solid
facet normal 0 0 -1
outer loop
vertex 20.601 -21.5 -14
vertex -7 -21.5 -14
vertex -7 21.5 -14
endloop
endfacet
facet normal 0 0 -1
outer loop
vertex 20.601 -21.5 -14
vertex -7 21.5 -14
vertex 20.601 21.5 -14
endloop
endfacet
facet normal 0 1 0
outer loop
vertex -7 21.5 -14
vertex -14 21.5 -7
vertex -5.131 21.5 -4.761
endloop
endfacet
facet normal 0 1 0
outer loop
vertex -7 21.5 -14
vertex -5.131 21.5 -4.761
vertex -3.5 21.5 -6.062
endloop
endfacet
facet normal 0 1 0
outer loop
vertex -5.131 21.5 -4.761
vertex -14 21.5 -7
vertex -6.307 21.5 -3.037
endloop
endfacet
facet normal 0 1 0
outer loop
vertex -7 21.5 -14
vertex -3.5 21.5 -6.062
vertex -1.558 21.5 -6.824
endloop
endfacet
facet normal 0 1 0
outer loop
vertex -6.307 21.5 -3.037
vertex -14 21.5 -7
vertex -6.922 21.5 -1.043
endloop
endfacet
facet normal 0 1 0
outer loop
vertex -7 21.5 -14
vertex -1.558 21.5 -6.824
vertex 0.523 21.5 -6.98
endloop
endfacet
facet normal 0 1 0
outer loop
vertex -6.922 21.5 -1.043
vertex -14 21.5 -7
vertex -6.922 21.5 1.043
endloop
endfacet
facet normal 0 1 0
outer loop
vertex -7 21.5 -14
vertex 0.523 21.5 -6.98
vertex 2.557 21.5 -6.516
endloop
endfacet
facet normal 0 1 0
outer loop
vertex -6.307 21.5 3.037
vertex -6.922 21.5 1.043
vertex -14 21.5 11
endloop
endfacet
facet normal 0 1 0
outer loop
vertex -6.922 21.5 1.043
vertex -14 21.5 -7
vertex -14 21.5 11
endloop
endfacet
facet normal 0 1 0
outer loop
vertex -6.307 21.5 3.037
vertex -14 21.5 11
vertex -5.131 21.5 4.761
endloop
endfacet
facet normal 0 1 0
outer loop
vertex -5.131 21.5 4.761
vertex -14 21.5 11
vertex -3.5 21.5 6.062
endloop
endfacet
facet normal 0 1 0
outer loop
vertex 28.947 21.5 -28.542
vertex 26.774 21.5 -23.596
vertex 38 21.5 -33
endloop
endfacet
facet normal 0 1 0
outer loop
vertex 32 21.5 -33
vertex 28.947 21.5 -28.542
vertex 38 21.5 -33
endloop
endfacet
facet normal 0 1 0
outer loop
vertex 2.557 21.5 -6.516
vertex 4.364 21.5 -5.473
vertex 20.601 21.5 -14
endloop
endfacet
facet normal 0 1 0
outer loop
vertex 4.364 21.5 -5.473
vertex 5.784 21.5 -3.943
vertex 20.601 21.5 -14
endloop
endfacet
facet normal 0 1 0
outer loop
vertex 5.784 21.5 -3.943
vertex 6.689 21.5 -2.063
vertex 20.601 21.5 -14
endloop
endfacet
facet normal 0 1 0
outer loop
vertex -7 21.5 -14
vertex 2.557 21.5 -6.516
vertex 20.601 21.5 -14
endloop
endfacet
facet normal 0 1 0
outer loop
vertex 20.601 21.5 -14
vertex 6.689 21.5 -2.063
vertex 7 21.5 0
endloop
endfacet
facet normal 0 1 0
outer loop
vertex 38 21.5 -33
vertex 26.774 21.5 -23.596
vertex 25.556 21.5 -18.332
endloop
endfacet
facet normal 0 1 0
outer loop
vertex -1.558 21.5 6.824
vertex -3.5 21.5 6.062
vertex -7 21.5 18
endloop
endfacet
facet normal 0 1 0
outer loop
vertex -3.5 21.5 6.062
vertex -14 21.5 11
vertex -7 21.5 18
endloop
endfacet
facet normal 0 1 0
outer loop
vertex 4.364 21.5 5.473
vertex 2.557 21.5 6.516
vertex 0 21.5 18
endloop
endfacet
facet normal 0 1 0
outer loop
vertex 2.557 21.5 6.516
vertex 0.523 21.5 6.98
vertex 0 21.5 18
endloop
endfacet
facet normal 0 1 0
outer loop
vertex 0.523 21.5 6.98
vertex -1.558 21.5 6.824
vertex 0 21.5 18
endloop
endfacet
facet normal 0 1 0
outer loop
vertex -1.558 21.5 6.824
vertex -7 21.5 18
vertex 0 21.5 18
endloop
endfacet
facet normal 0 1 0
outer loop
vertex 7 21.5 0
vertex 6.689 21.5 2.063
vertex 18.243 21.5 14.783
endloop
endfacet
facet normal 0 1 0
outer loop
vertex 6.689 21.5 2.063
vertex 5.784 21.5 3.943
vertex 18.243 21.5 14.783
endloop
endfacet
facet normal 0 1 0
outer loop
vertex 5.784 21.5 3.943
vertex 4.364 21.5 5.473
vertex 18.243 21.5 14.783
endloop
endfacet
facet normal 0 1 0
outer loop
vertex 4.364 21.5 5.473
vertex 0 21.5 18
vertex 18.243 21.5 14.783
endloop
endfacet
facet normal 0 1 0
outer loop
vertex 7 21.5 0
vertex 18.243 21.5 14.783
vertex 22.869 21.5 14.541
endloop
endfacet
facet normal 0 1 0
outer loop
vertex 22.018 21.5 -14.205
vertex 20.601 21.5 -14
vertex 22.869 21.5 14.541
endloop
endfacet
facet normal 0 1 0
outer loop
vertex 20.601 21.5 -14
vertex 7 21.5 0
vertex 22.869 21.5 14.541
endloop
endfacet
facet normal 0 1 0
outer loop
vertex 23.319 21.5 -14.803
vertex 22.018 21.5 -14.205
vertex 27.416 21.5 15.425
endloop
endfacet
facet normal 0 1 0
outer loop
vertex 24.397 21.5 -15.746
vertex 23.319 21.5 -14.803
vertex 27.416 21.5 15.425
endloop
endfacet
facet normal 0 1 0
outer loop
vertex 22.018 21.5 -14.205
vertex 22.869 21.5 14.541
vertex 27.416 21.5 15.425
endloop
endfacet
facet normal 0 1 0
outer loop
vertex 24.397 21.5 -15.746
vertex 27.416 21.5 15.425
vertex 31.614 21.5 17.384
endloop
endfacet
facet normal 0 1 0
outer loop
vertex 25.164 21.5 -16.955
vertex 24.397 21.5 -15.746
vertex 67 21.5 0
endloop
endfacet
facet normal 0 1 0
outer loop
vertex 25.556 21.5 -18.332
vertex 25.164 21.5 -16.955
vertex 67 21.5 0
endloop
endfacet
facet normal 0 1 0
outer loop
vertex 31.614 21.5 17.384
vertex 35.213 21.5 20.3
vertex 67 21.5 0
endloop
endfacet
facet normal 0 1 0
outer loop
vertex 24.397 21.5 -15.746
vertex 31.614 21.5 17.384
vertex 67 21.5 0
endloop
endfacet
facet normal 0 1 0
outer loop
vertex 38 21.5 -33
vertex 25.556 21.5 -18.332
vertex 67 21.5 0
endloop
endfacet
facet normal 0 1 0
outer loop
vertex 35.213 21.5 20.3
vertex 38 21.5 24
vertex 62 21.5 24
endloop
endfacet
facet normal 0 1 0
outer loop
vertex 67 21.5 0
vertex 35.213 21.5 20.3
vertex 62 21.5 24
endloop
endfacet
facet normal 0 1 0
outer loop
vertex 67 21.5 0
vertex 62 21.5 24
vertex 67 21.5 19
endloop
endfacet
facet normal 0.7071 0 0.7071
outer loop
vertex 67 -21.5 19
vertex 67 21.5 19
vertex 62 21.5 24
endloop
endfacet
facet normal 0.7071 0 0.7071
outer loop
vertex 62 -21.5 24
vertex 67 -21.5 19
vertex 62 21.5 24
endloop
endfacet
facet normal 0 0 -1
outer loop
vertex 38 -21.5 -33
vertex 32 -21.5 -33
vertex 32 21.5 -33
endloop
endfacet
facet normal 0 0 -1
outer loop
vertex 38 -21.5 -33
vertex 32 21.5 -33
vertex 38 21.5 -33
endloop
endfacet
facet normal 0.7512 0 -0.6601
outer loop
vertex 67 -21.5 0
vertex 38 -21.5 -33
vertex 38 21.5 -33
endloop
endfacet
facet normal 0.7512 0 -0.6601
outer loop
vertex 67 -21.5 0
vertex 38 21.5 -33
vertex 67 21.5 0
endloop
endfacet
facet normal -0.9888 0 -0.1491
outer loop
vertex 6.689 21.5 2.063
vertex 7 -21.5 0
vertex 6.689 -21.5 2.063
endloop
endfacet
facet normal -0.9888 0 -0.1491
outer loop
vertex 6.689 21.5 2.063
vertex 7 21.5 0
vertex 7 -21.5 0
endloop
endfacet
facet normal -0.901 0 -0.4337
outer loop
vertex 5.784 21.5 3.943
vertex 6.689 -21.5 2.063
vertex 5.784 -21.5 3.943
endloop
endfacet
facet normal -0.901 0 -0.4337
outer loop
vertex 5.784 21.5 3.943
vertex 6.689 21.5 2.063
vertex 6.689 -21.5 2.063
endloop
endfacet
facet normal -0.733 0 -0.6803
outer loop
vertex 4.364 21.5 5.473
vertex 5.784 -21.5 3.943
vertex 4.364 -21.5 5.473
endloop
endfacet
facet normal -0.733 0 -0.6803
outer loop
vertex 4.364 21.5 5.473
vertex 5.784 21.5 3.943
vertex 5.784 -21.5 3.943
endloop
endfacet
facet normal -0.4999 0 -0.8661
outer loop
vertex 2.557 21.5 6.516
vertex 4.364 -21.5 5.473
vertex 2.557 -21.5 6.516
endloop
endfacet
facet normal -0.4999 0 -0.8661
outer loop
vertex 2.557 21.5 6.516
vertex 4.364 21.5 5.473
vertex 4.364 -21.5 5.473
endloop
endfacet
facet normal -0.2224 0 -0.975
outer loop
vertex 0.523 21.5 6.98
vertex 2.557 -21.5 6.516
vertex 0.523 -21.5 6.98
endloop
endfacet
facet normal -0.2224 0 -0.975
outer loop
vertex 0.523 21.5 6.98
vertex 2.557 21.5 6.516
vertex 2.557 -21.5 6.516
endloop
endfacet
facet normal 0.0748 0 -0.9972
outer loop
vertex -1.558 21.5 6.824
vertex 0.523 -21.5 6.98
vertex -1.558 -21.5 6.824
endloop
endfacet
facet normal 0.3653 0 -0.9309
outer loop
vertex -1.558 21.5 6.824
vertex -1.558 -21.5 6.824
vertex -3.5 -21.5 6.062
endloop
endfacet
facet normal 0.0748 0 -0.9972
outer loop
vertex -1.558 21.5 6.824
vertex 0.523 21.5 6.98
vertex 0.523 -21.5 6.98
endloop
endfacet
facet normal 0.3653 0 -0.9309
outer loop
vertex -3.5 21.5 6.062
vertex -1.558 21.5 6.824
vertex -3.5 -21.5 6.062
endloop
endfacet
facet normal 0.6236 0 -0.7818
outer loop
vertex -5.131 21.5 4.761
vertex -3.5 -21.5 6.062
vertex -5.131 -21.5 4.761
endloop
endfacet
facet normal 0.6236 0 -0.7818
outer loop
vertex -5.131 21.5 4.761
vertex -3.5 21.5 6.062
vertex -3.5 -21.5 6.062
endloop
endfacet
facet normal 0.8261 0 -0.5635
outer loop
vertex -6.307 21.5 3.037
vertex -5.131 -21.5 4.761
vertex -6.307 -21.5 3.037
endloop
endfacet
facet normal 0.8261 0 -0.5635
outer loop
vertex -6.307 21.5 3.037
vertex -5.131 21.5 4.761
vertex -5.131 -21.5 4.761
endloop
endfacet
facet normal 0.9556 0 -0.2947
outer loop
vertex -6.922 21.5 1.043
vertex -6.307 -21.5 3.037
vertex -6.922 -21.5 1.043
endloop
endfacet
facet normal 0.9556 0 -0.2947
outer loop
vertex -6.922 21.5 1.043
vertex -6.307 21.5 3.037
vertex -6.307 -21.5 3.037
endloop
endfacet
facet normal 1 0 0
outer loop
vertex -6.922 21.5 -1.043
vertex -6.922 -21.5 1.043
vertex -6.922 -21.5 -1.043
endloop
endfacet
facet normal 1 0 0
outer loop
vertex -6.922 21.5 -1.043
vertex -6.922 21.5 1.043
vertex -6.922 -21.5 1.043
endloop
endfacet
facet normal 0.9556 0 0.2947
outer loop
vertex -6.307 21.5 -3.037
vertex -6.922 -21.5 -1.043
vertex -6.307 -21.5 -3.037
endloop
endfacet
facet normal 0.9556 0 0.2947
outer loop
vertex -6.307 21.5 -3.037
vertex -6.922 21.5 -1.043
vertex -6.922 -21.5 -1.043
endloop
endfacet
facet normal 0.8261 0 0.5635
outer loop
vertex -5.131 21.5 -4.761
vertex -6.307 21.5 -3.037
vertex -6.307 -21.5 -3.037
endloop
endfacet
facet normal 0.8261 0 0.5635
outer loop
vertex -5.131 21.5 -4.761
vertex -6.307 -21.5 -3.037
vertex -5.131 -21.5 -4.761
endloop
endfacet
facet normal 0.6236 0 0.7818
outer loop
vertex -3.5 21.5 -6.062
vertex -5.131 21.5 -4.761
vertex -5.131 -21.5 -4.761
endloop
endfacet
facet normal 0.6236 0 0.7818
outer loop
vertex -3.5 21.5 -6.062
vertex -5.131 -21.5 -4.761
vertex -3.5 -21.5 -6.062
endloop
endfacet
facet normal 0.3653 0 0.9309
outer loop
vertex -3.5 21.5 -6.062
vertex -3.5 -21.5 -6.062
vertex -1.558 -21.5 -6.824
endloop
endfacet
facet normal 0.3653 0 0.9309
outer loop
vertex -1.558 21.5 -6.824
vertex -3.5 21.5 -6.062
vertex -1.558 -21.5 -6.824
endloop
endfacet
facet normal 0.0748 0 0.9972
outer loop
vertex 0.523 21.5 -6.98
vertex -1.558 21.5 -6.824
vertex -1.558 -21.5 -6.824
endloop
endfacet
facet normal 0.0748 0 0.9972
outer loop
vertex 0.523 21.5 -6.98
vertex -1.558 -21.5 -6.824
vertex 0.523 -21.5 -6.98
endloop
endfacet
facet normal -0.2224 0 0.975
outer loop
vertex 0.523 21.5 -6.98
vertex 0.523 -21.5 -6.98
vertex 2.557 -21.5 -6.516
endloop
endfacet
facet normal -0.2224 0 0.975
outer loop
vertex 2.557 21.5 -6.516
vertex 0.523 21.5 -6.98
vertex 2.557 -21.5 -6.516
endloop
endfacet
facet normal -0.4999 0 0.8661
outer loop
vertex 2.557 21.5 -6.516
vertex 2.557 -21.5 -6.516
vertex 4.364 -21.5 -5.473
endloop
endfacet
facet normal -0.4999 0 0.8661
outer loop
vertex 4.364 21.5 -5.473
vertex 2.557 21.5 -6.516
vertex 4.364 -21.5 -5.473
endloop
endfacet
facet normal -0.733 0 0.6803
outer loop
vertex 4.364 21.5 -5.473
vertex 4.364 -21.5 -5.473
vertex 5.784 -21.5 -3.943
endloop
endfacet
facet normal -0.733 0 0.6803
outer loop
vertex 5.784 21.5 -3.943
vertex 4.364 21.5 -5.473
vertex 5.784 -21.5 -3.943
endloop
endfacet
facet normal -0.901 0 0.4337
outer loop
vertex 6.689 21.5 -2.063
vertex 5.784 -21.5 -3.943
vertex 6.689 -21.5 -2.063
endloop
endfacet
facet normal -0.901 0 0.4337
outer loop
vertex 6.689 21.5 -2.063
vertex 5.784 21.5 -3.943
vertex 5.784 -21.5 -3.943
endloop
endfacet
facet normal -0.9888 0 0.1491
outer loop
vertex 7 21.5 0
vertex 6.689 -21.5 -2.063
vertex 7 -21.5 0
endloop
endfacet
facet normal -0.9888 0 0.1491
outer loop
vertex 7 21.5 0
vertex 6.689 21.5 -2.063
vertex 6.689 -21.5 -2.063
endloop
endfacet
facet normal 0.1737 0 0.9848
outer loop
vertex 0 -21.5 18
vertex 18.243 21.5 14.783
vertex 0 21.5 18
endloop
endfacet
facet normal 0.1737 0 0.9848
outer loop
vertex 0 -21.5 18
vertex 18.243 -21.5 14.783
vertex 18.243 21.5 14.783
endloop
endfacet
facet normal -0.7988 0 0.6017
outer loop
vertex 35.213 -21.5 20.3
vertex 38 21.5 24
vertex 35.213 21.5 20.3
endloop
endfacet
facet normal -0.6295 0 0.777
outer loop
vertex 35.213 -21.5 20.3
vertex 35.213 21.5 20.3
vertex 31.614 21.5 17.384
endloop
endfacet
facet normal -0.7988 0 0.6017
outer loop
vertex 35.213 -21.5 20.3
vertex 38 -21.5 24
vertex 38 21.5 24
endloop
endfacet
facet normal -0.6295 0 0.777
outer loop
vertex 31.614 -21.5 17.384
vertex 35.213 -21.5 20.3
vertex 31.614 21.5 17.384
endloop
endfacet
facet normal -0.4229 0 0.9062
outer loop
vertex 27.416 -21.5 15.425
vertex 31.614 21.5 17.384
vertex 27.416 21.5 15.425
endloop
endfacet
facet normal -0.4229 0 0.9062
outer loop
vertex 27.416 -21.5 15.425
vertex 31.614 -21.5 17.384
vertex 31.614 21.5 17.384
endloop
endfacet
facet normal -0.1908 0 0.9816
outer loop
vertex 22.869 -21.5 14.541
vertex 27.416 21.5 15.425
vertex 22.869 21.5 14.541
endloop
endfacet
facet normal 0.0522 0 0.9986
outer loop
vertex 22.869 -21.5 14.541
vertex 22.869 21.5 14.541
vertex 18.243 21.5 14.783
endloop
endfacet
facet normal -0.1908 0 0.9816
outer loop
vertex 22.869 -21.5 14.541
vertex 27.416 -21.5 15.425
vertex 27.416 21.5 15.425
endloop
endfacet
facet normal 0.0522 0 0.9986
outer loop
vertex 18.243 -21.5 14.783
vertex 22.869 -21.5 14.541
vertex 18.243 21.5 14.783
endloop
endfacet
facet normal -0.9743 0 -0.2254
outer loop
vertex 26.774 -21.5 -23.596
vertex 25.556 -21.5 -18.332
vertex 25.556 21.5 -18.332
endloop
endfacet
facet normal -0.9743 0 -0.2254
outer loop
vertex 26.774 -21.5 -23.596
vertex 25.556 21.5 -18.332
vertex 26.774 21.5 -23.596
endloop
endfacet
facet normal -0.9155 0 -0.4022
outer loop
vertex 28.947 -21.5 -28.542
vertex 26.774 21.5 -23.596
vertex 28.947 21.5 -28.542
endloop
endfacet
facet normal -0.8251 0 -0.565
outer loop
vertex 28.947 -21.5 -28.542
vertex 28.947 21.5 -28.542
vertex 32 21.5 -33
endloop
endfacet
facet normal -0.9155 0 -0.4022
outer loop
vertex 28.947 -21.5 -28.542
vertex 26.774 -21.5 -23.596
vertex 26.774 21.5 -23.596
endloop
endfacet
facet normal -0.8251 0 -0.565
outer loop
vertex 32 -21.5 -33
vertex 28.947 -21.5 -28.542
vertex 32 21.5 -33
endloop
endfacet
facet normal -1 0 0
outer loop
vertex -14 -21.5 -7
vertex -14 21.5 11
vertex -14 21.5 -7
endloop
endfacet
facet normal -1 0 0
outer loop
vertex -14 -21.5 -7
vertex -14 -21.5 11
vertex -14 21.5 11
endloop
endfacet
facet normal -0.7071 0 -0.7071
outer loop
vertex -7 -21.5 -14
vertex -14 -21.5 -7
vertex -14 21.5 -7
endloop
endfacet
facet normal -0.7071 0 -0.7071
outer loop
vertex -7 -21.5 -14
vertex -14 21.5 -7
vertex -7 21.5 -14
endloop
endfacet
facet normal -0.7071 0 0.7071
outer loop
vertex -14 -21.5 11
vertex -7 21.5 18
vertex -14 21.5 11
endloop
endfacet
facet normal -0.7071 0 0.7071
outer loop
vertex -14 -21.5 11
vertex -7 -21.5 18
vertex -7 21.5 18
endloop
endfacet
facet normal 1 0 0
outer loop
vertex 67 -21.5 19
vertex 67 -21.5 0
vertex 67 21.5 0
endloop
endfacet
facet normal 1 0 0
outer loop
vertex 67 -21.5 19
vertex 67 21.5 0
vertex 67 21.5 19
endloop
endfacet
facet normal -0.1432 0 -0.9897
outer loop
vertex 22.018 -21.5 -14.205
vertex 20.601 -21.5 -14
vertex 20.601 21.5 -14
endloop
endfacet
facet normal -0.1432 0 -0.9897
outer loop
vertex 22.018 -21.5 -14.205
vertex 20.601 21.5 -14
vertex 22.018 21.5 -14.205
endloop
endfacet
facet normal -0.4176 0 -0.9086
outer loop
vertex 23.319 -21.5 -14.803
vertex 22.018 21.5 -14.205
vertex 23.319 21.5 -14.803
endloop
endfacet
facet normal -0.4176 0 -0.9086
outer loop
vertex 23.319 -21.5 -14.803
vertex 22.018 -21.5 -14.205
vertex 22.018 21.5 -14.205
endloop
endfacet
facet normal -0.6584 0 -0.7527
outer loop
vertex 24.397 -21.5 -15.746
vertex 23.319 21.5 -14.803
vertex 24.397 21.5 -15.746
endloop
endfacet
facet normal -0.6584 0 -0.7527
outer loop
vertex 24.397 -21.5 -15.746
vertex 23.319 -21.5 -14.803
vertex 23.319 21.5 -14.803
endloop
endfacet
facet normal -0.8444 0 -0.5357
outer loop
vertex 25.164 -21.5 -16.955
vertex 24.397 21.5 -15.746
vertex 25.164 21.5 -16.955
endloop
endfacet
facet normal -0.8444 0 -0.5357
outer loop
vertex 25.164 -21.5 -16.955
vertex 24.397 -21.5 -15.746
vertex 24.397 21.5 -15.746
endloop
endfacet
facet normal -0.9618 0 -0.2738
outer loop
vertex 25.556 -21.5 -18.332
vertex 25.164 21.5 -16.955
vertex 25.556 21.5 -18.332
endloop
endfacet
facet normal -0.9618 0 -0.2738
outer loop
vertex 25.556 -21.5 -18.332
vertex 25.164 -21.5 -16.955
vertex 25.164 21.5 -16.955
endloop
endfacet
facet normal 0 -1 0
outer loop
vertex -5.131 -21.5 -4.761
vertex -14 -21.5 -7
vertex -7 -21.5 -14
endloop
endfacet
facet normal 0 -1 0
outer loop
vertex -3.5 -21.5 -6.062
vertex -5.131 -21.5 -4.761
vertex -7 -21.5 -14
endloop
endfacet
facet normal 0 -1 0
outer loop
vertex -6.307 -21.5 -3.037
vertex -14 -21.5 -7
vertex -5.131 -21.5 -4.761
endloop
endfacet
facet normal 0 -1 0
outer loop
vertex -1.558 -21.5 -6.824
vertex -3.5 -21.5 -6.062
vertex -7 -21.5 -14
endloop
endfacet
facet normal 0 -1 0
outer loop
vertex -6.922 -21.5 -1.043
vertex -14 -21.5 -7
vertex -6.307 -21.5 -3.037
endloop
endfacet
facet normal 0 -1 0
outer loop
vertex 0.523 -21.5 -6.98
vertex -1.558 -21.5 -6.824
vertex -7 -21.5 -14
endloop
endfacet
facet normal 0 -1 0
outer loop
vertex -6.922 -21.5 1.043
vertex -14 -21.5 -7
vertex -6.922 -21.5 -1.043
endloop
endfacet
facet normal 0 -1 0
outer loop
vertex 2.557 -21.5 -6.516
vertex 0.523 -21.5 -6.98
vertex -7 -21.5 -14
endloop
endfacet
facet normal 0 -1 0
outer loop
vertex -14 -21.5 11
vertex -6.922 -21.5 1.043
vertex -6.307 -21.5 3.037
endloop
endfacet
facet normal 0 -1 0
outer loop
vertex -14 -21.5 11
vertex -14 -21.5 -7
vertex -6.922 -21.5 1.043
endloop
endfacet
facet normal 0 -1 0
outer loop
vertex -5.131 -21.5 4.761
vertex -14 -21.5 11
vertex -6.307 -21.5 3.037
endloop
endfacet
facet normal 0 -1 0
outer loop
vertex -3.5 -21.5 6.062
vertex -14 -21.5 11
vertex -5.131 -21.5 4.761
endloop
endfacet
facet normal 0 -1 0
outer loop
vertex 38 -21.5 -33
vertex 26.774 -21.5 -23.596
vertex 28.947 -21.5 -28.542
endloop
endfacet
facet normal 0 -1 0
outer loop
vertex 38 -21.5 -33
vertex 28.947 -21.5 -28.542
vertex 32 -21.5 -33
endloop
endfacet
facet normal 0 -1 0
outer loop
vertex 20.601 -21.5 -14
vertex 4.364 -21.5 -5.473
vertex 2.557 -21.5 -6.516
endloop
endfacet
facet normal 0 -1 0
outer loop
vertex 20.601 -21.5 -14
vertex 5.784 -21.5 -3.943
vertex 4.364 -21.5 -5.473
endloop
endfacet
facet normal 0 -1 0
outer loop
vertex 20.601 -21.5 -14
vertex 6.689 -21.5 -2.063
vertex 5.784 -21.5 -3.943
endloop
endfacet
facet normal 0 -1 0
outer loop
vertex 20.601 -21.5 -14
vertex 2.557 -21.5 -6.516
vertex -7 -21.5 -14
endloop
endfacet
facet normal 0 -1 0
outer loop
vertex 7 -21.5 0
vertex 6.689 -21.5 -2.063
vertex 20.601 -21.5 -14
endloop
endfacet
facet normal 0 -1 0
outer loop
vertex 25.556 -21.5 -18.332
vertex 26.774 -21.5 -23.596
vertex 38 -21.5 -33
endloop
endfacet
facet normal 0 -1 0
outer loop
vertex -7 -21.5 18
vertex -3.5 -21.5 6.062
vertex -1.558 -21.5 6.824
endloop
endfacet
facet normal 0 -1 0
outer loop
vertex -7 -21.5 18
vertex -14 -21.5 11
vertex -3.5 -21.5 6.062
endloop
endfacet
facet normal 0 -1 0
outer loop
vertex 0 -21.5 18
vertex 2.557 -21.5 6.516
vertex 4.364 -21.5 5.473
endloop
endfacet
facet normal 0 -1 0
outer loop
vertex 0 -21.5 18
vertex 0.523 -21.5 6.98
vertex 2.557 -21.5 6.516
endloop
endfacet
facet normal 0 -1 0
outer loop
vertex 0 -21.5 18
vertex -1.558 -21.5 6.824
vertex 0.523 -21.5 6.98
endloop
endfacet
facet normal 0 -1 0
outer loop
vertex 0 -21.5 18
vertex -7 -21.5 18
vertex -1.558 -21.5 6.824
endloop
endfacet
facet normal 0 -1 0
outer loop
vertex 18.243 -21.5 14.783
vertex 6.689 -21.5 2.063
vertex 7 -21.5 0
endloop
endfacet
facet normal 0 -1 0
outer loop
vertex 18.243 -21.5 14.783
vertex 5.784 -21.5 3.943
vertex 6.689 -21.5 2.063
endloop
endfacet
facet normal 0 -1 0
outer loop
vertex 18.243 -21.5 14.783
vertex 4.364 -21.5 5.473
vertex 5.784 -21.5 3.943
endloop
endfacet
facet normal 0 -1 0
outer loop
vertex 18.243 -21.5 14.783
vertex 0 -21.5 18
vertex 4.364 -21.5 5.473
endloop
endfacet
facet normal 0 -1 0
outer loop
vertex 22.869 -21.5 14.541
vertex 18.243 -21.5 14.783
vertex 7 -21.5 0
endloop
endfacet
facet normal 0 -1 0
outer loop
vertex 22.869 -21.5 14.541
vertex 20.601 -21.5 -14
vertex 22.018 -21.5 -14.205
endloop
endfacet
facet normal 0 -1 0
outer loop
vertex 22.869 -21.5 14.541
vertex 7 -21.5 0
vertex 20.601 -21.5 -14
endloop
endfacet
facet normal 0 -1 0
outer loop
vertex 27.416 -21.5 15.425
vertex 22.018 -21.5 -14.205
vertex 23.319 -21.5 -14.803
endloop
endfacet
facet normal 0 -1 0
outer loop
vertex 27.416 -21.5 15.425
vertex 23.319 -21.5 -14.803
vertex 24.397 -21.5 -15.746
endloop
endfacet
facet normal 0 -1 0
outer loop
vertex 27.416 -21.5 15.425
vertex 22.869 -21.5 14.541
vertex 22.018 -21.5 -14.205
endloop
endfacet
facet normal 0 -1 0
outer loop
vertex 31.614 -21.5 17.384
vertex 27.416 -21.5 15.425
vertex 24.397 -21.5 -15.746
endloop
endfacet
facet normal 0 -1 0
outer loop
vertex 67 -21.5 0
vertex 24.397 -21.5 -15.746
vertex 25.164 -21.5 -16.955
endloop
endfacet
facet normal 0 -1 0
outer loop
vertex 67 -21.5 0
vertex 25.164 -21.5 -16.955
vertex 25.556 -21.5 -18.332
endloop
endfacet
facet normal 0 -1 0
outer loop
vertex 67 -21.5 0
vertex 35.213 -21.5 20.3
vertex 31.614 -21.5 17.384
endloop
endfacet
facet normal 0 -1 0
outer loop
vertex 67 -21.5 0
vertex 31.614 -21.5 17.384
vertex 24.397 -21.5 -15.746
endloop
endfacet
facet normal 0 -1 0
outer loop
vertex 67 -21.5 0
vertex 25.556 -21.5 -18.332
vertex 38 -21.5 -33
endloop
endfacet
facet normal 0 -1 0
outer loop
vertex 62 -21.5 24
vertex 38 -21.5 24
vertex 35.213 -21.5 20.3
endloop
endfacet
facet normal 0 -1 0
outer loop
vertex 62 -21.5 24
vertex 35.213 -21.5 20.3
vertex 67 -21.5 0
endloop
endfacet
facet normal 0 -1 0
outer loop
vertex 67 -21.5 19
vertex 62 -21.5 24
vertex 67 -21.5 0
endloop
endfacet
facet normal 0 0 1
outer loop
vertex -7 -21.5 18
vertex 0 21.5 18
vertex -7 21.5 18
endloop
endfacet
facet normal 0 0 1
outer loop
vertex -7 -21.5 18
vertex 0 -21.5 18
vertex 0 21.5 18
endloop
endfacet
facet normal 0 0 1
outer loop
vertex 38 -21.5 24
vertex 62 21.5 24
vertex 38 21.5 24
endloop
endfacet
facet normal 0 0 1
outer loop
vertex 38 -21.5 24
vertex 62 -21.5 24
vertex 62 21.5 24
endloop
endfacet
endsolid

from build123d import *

# Parameters (mm, degrees)
F0_R     = 7
F1_DEPTH = 21.5


with BuildPart() as f1:
    # F0 (on Front) → F1 (new body, symmetric)
    with BuildSketch(Plane.XZ):
        with BuildLine():
            Line((-14, 11), (-14, -7))
            Line((-14, -7), (-7, -14))
            Line((-7, -14), (20.601225, -14))
            ThreePointArc((20.601225, -14), (23.892034, -15.235617), (25.556371, -18.331769))
            ThreePointArc((25.556371, -18.331769), (27.745149, -26.119689), (32, -33))
            Line((32, -33), (38, -33))
            Line((38, -33), (67, 0))
            Line((67, 0), (67, 19))
            Line((67, 19), (62, 24))
            Line((62, 24), (38, 24))
            ThreePointArc((38, 24), (29.574973, 16.276069), (18.243085, 14.783252))
            Line((18.243085, 14.783252), (0, 18))
            Line((0, 18), (-7, 18))
            Line((-7, 18), (-14, 11))
        make_face()
        Circle(F0_R, mode=Mode.SUBTRACT)
    extrude(amount=F1_DEPTH, both=True)


solid = f1.part
